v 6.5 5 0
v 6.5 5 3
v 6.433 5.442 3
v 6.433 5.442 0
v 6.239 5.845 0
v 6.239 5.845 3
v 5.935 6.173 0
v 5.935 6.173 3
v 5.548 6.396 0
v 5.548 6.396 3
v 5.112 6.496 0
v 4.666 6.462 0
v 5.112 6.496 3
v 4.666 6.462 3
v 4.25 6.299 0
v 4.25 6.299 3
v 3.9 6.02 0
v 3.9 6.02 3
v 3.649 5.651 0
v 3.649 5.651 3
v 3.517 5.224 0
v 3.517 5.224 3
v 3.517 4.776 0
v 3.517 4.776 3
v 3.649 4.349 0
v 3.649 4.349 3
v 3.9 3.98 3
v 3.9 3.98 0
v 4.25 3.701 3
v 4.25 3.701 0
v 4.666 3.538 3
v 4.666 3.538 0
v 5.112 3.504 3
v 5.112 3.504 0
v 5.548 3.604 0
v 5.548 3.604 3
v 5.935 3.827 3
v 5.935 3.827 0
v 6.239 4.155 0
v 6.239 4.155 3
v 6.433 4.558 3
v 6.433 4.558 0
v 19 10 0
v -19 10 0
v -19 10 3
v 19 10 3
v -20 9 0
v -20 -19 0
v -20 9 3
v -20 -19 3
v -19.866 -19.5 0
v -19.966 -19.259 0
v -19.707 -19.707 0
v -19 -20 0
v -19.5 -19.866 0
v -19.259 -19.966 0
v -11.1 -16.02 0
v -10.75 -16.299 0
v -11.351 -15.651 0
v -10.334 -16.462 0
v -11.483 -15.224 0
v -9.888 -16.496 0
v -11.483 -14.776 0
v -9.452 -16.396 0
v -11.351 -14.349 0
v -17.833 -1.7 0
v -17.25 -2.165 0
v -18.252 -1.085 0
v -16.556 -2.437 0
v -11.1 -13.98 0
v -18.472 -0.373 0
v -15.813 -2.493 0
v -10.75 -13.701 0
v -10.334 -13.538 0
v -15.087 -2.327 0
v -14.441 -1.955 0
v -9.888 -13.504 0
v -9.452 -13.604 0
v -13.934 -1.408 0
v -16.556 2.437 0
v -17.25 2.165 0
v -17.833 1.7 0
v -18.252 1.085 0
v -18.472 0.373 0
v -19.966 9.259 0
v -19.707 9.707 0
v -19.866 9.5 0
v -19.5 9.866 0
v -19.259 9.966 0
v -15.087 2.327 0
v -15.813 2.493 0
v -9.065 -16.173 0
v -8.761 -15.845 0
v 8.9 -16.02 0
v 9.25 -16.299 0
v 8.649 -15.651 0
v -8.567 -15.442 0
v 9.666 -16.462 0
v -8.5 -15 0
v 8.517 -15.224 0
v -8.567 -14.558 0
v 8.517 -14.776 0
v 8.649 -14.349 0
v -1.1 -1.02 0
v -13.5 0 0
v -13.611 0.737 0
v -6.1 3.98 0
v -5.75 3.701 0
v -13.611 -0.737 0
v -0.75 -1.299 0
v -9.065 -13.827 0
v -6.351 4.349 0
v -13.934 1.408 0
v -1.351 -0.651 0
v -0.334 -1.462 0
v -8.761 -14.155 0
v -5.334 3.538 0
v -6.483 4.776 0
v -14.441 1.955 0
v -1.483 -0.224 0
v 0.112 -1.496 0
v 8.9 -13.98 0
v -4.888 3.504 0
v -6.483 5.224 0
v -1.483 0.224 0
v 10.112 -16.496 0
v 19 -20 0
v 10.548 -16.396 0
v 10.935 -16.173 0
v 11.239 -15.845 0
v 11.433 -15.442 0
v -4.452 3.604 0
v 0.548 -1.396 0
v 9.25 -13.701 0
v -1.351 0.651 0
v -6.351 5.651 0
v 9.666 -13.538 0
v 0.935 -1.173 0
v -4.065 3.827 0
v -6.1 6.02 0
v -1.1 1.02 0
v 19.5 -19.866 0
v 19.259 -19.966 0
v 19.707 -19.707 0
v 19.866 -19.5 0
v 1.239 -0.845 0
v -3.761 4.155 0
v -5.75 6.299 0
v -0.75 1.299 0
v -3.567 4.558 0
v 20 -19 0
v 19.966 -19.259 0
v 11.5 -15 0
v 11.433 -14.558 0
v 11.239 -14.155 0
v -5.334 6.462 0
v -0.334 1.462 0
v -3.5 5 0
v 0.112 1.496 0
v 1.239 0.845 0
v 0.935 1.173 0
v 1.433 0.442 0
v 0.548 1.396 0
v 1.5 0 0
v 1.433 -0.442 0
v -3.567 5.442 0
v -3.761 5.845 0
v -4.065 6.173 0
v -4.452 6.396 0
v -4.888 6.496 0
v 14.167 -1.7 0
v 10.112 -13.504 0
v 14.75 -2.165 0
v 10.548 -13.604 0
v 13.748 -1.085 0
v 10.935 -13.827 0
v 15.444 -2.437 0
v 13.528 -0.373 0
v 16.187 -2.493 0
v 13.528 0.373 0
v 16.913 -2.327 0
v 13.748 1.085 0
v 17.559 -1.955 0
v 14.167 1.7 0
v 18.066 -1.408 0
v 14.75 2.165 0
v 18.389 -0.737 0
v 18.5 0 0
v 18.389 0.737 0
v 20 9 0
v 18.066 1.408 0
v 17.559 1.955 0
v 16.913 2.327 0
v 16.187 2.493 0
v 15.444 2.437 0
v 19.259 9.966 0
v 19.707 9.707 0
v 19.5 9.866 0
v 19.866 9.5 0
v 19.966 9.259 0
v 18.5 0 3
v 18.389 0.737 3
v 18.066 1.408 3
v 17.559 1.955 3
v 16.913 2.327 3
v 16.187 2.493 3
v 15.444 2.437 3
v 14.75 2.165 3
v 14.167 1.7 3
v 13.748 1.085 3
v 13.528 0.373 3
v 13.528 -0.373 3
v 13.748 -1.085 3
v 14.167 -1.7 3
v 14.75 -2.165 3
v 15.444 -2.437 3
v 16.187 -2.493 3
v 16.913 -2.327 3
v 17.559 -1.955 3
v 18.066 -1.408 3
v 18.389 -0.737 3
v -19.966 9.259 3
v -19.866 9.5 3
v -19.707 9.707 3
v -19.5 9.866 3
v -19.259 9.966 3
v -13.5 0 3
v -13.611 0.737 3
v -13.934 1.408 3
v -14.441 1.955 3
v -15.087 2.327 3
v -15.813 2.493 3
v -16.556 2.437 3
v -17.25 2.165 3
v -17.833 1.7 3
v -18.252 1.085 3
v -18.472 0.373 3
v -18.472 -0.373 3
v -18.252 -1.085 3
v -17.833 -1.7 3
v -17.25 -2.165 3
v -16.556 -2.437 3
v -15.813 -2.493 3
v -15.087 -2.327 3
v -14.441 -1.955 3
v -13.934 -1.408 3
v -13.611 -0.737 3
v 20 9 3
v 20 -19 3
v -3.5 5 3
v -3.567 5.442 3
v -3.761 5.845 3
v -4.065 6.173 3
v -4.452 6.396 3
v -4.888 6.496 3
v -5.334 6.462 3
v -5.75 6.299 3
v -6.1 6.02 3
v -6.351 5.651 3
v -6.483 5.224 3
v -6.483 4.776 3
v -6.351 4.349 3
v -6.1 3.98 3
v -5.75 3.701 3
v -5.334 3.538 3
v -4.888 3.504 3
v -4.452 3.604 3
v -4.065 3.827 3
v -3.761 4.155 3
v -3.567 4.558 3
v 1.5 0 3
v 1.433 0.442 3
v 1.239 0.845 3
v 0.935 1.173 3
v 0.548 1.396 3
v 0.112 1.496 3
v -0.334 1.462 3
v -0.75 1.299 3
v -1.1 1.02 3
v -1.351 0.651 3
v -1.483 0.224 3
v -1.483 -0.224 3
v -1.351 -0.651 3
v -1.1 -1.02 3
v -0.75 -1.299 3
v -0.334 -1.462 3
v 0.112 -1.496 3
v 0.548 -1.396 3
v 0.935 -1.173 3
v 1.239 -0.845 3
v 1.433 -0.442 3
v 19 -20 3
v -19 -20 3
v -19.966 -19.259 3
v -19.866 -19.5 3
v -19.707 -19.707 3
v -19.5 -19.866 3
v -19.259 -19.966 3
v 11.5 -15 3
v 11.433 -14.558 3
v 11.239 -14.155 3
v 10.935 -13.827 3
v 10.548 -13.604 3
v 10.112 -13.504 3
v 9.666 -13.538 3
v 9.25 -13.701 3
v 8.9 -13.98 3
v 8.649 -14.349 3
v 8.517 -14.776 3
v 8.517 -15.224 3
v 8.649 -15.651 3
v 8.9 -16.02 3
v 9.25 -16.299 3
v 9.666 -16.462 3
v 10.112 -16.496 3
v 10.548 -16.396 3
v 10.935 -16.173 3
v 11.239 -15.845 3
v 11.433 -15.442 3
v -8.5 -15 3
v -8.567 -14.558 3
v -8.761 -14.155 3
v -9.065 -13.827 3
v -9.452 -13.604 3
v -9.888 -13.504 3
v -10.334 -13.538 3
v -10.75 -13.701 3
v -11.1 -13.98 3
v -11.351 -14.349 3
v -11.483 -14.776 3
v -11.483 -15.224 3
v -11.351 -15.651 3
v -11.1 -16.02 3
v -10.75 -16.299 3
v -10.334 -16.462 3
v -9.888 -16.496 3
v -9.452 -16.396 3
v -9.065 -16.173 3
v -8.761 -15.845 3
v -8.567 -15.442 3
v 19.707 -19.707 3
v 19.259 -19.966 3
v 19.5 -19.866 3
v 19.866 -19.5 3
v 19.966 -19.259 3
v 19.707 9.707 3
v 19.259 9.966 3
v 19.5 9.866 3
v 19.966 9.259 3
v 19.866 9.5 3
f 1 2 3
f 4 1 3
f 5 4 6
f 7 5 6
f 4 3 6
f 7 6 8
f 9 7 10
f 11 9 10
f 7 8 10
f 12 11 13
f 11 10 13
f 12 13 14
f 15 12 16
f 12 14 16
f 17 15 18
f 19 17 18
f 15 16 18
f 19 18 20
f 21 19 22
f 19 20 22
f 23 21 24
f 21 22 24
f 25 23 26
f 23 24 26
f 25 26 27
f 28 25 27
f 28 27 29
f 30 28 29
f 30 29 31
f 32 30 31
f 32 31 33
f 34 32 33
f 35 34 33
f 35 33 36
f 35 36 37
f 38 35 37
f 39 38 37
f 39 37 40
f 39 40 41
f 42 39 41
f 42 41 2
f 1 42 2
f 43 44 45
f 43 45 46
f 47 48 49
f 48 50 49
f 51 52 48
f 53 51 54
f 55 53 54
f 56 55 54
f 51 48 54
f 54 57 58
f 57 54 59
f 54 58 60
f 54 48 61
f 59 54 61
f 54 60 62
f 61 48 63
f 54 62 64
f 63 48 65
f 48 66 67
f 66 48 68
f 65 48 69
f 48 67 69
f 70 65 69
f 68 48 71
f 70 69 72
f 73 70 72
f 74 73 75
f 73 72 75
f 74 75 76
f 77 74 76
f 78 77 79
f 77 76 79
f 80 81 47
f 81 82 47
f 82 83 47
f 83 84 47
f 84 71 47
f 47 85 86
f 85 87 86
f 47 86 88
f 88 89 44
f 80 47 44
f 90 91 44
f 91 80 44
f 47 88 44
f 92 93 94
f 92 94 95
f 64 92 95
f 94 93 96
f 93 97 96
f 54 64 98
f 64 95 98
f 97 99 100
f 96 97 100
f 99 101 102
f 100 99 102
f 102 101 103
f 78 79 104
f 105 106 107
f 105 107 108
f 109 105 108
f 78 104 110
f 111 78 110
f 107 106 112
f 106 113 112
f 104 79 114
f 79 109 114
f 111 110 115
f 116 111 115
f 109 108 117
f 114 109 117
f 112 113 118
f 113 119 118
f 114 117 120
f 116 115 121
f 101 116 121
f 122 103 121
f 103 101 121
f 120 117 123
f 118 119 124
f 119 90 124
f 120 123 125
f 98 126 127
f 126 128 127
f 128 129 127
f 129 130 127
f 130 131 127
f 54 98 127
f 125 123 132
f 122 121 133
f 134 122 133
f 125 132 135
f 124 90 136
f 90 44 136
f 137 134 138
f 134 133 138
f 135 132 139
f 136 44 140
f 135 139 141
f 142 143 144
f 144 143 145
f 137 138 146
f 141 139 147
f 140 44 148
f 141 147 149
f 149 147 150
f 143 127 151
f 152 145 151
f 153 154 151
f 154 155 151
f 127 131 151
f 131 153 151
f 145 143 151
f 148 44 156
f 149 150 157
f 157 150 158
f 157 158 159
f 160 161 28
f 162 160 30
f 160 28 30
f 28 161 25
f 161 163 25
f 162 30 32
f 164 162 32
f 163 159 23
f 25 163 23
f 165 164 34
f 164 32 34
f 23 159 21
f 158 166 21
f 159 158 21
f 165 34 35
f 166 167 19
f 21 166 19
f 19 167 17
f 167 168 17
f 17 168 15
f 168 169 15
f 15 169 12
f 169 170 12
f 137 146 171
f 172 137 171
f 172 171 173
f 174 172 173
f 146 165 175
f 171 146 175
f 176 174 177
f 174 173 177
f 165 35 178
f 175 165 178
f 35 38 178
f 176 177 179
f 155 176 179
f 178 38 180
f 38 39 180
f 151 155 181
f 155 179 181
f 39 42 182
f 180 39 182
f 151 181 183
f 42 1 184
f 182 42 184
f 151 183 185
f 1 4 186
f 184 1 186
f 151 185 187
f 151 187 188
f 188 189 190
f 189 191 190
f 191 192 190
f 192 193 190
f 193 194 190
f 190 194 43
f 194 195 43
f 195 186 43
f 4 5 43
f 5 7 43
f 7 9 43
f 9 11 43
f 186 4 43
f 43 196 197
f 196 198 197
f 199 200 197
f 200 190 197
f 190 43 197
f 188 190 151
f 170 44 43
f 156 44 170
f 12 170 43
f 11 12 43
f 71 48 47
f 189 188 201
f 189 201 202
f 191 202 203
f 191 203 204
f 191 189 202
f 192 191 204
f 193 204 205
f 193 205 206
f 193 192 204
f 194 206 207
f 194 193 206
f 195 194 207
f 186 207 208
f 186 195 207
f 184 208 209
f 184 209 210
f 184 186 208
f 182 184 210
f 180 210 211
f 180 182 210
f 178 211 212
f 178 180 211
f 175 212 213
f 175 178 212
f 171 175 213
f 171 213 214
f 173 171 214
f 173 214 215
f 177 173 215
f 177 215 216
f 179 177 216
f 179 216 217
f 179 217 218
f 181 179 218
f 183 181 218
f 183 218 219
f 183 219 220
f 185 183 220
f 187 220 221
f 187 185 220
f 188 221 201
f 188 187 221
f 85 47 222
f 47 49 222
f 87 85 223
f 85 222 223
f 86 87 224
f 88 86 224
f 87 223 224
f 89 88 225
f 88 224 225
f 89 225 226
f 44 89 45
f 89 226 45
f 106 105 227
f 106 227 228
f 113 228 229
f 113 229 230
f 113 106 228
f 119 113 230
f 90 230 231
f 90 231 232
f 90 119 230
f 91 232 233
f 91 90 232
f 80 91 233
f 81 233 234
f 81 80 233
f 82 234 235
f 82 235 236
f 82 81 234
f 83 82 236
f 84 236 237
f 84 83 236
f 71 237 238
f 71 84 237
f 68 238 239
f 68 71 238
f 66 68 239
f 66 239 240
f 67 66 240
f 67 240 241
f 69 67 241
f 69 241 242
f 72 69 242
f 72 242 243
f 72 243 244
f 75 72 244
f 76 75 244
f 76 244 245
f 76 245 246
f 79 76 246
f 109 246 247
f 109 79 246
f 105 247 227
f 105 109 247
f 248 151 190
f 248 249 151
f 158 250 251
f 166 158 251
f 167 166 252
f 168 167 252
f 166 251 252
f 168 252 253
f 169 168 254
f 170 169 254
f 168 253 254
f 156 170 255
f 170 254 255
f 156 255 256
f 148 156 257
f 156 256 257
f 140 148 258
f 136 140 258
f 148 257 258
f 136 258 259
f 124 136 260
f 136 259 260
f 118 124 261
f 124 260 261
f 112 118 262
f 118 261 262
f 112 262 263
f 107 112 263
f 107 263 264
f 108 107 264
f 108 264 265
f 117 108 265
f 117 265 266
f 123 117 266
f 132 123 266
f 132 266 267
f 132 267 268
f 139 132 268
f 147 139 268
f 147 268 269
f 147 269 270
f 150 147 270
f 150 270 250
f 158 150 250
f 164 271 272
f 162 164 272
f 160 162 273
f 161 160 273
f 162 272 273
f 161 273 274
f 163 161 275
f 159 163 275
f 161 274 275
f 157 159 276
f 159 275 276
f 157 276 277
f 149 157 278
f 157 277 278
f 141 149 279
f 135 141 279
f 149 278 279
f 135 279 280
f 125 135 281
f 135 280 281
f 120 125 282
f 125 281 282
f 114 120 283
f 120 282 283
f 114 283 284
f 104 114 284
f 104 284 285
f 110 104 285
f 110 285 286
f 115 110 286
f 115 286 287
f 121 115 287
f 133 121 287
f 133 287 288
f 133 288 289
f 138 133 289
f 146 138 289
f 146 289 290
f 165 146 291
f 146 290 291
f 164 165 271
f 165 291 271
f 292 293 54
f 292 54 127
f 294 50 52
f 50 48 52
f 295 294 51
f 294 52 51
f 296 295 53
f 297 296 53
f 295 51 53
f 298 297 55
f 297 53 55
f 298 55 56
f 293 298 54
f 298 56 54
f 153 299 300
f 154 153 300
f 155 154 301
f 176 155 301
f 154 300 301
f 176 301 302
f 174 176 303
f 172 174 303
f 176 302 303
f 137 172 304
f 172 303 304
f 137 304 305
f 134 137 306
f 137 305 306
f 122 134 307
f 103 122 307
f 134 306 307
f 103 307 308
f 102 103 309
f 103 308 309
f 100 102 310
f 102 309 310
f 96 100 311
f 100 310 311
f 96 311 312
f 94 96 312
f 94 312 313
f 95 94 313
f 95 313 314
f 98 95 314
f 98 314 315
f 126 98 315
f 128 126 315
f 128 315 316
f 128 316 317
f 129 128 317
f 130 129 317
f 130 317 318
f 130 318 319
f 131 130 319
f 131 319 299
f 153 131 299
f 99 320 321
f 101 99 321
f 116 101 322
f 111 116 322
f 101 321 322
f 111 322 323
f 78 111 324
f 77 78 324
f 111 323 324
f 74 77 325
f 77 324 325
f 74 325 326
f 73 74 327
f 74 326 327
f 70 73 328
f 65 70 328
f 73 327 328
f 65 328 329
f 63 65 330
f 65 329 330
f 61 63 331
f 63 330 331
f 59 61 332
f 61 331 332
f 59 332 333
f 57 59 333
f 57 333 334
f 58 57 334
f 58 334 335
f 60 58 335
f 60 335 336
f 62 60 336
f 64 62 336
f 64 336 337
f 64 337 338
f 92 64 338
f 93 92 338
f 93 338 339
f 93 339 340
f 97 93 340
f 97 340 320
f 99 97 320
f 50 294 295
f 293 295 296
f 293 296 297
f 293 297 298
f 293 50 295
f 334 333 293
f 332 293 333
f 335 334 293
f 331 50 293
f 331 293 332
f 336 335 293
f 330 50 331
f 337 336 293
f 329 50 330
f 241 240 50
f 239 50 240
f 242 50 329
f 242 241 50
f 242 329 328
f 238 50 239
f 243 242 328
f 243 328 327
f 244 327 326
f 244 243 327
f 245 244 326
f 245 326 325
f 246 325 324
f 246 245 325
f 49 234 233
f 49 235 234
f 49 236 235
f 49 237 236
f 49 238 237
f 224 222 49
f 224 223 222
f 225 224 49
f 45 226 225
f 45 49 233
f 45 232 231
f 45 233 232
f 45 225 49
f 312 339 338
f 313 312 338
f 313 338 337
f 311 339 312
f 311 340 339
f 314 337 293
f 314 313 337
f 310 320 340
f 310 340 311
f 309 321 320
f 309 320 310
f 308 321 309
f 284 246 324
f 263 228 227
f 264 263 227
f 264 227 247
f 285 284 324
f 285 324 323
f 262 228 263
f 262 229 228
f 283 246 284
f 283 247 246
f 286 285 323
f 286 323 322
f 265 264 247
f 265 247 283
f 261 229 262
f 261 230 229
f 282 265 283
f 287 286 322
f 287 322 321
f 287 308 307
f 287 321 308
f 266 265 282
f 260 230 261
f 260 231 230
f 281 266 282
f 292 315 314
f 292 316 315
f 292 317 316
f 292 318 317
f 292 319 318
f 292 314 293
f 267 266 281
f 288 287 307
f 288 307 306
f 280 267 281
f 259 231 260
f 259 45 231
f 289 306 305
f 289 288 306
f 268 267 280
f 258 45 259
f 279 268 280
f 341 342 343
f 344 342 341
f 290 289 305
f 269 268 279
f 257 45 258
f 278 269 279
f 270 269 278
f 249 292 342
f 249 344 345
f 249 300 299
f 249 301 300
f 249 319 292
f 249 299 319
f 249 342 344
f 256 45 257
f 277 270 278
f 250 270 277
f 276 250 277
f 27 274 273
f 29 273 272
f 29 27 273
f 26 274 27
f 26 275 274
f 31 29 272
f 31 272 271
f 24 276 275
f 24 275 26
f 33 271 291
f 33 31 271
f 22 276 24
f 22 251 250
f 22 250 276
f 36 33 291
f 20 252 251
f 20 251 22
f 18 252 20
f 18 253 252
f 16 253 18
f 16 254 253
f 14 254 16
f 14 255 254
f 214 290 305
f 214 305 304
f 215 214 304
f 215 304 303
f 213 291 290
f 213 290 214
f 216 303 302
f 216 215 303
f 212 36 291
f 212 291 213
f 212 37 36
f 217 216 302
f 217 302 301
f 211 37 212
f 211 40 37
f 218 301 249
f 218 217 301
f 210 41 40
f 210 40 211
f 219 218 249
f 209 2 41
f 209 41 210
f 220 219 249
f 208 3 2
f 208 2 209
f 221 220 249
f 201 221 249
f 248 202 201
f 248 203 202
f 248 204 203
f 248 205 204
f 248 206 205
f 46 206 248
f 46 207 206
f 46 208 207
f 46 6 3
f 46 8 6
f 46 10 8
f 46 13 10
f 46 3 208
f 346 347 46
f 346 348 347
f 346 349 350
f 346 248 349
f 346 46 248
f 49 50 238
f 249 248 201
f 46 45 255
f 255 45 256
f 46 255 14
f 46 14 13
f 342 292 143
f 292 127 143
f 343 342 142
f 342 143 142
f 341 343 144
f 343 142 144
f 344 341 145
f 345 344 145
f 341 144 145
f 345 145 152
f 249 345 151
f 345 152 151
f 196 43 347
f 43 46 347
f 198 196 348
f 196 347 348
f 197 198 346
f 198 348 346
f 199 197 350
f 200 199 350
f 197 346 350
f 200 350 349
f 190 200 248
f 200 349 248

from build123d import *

# Parameters (mm, degrees)
SKETCH_1_W          = 40
SKETCH_1_H          = 20
SKETCH_1_R          = 2.5
EXTRUDE_1_DEPTH     = 3
SKETCH_2_R          = 1.5
CUT_EXTRUDE_1_DEPTH = 3
SKETCH_4_W          = 40
SKETCH_4_H          = 10
EXTRUDE_2_DEPTH     = 3
SKETCH_5_R          = 1.5
CUT_EXTRUDE_2_DEPTH = 10
SKETCH_6_R          = 1.5
CUT_EXTRUDE_3_DEPTH = 10
FILLET_1_R          = 1


with BuildPart() as part:
    # 草图1 → 凸台-拉伸1 (new body)
    with BuildSketch(Plane.XY):
        Rectangle(SKETCH_1_W, SKETCH_1_H)
        with Locations((-16, 0)):
            Circle(SKETCH_1_R, mode=Mode.SUBTRACT)
        with Locations((16, 0)):
            Circle(SKETCH_1_R, mode=Mode.SUBTRACT)
    extrude(amount=EXTRUDE_1_DEPTH)

    # 草图2 → 切除-拉伸1 (cut)
    with BuildSketch(Plane.XY.offset(3)):
        Circle(SKETCH_2_R)
    extrude(amount=-CUT_EXTRUDE_1_DEPTH, mode=Mode.SUBTRACT)

    # 草图4 → 凸台-拉伸2 (add)
    with BuildSketch(Plane.XY.offset(3)):
        with Locations((0, -15)):
            Rectangle(SKETCH_4_W, SKETCH_4_H)
    extrude(amount=-EXTRUDE_2_DEPTH)

    # 草图5 → 切除-拉伸2 (cut)
    with BuildSketch(Plane.XY.offset(3)):
        with Locations((-10, -15)):
            Circle(SKETCH_5_R)
        with Locations((10, -15)):
            Circle(SKETCH_5_R)
    extrude(amount=-CUT_EXTRUDE_2_DEPTH, mode=Mode.SUBTRACT)

    # 草图6 → 切除-拉伸3 (cut)
    with BuildSketch(Plane.XY.offset(3)):
        with Locations((-5, 5)):
            Circle(SKETCH_6_R)
        with Locations((5, 5)):
            Circle(SKETCH_6_R)
    extrude(amount=-CUT_EXTRUDE_3_DEPTH, mode=Mode.SUBTRACT)

    # 圆角1
    fillet_1_edges = [part.edges().sort_by_distance(p)[0] for p in [
        (-20, -20, 1.5),
        (20, -20, 1.5),
        (-20, 10, 1.5),
        (20, 10, 1.5),
    ]]
    fillet(fillet_1_edges, radius=FILLET_1_R)


solid = part.part
